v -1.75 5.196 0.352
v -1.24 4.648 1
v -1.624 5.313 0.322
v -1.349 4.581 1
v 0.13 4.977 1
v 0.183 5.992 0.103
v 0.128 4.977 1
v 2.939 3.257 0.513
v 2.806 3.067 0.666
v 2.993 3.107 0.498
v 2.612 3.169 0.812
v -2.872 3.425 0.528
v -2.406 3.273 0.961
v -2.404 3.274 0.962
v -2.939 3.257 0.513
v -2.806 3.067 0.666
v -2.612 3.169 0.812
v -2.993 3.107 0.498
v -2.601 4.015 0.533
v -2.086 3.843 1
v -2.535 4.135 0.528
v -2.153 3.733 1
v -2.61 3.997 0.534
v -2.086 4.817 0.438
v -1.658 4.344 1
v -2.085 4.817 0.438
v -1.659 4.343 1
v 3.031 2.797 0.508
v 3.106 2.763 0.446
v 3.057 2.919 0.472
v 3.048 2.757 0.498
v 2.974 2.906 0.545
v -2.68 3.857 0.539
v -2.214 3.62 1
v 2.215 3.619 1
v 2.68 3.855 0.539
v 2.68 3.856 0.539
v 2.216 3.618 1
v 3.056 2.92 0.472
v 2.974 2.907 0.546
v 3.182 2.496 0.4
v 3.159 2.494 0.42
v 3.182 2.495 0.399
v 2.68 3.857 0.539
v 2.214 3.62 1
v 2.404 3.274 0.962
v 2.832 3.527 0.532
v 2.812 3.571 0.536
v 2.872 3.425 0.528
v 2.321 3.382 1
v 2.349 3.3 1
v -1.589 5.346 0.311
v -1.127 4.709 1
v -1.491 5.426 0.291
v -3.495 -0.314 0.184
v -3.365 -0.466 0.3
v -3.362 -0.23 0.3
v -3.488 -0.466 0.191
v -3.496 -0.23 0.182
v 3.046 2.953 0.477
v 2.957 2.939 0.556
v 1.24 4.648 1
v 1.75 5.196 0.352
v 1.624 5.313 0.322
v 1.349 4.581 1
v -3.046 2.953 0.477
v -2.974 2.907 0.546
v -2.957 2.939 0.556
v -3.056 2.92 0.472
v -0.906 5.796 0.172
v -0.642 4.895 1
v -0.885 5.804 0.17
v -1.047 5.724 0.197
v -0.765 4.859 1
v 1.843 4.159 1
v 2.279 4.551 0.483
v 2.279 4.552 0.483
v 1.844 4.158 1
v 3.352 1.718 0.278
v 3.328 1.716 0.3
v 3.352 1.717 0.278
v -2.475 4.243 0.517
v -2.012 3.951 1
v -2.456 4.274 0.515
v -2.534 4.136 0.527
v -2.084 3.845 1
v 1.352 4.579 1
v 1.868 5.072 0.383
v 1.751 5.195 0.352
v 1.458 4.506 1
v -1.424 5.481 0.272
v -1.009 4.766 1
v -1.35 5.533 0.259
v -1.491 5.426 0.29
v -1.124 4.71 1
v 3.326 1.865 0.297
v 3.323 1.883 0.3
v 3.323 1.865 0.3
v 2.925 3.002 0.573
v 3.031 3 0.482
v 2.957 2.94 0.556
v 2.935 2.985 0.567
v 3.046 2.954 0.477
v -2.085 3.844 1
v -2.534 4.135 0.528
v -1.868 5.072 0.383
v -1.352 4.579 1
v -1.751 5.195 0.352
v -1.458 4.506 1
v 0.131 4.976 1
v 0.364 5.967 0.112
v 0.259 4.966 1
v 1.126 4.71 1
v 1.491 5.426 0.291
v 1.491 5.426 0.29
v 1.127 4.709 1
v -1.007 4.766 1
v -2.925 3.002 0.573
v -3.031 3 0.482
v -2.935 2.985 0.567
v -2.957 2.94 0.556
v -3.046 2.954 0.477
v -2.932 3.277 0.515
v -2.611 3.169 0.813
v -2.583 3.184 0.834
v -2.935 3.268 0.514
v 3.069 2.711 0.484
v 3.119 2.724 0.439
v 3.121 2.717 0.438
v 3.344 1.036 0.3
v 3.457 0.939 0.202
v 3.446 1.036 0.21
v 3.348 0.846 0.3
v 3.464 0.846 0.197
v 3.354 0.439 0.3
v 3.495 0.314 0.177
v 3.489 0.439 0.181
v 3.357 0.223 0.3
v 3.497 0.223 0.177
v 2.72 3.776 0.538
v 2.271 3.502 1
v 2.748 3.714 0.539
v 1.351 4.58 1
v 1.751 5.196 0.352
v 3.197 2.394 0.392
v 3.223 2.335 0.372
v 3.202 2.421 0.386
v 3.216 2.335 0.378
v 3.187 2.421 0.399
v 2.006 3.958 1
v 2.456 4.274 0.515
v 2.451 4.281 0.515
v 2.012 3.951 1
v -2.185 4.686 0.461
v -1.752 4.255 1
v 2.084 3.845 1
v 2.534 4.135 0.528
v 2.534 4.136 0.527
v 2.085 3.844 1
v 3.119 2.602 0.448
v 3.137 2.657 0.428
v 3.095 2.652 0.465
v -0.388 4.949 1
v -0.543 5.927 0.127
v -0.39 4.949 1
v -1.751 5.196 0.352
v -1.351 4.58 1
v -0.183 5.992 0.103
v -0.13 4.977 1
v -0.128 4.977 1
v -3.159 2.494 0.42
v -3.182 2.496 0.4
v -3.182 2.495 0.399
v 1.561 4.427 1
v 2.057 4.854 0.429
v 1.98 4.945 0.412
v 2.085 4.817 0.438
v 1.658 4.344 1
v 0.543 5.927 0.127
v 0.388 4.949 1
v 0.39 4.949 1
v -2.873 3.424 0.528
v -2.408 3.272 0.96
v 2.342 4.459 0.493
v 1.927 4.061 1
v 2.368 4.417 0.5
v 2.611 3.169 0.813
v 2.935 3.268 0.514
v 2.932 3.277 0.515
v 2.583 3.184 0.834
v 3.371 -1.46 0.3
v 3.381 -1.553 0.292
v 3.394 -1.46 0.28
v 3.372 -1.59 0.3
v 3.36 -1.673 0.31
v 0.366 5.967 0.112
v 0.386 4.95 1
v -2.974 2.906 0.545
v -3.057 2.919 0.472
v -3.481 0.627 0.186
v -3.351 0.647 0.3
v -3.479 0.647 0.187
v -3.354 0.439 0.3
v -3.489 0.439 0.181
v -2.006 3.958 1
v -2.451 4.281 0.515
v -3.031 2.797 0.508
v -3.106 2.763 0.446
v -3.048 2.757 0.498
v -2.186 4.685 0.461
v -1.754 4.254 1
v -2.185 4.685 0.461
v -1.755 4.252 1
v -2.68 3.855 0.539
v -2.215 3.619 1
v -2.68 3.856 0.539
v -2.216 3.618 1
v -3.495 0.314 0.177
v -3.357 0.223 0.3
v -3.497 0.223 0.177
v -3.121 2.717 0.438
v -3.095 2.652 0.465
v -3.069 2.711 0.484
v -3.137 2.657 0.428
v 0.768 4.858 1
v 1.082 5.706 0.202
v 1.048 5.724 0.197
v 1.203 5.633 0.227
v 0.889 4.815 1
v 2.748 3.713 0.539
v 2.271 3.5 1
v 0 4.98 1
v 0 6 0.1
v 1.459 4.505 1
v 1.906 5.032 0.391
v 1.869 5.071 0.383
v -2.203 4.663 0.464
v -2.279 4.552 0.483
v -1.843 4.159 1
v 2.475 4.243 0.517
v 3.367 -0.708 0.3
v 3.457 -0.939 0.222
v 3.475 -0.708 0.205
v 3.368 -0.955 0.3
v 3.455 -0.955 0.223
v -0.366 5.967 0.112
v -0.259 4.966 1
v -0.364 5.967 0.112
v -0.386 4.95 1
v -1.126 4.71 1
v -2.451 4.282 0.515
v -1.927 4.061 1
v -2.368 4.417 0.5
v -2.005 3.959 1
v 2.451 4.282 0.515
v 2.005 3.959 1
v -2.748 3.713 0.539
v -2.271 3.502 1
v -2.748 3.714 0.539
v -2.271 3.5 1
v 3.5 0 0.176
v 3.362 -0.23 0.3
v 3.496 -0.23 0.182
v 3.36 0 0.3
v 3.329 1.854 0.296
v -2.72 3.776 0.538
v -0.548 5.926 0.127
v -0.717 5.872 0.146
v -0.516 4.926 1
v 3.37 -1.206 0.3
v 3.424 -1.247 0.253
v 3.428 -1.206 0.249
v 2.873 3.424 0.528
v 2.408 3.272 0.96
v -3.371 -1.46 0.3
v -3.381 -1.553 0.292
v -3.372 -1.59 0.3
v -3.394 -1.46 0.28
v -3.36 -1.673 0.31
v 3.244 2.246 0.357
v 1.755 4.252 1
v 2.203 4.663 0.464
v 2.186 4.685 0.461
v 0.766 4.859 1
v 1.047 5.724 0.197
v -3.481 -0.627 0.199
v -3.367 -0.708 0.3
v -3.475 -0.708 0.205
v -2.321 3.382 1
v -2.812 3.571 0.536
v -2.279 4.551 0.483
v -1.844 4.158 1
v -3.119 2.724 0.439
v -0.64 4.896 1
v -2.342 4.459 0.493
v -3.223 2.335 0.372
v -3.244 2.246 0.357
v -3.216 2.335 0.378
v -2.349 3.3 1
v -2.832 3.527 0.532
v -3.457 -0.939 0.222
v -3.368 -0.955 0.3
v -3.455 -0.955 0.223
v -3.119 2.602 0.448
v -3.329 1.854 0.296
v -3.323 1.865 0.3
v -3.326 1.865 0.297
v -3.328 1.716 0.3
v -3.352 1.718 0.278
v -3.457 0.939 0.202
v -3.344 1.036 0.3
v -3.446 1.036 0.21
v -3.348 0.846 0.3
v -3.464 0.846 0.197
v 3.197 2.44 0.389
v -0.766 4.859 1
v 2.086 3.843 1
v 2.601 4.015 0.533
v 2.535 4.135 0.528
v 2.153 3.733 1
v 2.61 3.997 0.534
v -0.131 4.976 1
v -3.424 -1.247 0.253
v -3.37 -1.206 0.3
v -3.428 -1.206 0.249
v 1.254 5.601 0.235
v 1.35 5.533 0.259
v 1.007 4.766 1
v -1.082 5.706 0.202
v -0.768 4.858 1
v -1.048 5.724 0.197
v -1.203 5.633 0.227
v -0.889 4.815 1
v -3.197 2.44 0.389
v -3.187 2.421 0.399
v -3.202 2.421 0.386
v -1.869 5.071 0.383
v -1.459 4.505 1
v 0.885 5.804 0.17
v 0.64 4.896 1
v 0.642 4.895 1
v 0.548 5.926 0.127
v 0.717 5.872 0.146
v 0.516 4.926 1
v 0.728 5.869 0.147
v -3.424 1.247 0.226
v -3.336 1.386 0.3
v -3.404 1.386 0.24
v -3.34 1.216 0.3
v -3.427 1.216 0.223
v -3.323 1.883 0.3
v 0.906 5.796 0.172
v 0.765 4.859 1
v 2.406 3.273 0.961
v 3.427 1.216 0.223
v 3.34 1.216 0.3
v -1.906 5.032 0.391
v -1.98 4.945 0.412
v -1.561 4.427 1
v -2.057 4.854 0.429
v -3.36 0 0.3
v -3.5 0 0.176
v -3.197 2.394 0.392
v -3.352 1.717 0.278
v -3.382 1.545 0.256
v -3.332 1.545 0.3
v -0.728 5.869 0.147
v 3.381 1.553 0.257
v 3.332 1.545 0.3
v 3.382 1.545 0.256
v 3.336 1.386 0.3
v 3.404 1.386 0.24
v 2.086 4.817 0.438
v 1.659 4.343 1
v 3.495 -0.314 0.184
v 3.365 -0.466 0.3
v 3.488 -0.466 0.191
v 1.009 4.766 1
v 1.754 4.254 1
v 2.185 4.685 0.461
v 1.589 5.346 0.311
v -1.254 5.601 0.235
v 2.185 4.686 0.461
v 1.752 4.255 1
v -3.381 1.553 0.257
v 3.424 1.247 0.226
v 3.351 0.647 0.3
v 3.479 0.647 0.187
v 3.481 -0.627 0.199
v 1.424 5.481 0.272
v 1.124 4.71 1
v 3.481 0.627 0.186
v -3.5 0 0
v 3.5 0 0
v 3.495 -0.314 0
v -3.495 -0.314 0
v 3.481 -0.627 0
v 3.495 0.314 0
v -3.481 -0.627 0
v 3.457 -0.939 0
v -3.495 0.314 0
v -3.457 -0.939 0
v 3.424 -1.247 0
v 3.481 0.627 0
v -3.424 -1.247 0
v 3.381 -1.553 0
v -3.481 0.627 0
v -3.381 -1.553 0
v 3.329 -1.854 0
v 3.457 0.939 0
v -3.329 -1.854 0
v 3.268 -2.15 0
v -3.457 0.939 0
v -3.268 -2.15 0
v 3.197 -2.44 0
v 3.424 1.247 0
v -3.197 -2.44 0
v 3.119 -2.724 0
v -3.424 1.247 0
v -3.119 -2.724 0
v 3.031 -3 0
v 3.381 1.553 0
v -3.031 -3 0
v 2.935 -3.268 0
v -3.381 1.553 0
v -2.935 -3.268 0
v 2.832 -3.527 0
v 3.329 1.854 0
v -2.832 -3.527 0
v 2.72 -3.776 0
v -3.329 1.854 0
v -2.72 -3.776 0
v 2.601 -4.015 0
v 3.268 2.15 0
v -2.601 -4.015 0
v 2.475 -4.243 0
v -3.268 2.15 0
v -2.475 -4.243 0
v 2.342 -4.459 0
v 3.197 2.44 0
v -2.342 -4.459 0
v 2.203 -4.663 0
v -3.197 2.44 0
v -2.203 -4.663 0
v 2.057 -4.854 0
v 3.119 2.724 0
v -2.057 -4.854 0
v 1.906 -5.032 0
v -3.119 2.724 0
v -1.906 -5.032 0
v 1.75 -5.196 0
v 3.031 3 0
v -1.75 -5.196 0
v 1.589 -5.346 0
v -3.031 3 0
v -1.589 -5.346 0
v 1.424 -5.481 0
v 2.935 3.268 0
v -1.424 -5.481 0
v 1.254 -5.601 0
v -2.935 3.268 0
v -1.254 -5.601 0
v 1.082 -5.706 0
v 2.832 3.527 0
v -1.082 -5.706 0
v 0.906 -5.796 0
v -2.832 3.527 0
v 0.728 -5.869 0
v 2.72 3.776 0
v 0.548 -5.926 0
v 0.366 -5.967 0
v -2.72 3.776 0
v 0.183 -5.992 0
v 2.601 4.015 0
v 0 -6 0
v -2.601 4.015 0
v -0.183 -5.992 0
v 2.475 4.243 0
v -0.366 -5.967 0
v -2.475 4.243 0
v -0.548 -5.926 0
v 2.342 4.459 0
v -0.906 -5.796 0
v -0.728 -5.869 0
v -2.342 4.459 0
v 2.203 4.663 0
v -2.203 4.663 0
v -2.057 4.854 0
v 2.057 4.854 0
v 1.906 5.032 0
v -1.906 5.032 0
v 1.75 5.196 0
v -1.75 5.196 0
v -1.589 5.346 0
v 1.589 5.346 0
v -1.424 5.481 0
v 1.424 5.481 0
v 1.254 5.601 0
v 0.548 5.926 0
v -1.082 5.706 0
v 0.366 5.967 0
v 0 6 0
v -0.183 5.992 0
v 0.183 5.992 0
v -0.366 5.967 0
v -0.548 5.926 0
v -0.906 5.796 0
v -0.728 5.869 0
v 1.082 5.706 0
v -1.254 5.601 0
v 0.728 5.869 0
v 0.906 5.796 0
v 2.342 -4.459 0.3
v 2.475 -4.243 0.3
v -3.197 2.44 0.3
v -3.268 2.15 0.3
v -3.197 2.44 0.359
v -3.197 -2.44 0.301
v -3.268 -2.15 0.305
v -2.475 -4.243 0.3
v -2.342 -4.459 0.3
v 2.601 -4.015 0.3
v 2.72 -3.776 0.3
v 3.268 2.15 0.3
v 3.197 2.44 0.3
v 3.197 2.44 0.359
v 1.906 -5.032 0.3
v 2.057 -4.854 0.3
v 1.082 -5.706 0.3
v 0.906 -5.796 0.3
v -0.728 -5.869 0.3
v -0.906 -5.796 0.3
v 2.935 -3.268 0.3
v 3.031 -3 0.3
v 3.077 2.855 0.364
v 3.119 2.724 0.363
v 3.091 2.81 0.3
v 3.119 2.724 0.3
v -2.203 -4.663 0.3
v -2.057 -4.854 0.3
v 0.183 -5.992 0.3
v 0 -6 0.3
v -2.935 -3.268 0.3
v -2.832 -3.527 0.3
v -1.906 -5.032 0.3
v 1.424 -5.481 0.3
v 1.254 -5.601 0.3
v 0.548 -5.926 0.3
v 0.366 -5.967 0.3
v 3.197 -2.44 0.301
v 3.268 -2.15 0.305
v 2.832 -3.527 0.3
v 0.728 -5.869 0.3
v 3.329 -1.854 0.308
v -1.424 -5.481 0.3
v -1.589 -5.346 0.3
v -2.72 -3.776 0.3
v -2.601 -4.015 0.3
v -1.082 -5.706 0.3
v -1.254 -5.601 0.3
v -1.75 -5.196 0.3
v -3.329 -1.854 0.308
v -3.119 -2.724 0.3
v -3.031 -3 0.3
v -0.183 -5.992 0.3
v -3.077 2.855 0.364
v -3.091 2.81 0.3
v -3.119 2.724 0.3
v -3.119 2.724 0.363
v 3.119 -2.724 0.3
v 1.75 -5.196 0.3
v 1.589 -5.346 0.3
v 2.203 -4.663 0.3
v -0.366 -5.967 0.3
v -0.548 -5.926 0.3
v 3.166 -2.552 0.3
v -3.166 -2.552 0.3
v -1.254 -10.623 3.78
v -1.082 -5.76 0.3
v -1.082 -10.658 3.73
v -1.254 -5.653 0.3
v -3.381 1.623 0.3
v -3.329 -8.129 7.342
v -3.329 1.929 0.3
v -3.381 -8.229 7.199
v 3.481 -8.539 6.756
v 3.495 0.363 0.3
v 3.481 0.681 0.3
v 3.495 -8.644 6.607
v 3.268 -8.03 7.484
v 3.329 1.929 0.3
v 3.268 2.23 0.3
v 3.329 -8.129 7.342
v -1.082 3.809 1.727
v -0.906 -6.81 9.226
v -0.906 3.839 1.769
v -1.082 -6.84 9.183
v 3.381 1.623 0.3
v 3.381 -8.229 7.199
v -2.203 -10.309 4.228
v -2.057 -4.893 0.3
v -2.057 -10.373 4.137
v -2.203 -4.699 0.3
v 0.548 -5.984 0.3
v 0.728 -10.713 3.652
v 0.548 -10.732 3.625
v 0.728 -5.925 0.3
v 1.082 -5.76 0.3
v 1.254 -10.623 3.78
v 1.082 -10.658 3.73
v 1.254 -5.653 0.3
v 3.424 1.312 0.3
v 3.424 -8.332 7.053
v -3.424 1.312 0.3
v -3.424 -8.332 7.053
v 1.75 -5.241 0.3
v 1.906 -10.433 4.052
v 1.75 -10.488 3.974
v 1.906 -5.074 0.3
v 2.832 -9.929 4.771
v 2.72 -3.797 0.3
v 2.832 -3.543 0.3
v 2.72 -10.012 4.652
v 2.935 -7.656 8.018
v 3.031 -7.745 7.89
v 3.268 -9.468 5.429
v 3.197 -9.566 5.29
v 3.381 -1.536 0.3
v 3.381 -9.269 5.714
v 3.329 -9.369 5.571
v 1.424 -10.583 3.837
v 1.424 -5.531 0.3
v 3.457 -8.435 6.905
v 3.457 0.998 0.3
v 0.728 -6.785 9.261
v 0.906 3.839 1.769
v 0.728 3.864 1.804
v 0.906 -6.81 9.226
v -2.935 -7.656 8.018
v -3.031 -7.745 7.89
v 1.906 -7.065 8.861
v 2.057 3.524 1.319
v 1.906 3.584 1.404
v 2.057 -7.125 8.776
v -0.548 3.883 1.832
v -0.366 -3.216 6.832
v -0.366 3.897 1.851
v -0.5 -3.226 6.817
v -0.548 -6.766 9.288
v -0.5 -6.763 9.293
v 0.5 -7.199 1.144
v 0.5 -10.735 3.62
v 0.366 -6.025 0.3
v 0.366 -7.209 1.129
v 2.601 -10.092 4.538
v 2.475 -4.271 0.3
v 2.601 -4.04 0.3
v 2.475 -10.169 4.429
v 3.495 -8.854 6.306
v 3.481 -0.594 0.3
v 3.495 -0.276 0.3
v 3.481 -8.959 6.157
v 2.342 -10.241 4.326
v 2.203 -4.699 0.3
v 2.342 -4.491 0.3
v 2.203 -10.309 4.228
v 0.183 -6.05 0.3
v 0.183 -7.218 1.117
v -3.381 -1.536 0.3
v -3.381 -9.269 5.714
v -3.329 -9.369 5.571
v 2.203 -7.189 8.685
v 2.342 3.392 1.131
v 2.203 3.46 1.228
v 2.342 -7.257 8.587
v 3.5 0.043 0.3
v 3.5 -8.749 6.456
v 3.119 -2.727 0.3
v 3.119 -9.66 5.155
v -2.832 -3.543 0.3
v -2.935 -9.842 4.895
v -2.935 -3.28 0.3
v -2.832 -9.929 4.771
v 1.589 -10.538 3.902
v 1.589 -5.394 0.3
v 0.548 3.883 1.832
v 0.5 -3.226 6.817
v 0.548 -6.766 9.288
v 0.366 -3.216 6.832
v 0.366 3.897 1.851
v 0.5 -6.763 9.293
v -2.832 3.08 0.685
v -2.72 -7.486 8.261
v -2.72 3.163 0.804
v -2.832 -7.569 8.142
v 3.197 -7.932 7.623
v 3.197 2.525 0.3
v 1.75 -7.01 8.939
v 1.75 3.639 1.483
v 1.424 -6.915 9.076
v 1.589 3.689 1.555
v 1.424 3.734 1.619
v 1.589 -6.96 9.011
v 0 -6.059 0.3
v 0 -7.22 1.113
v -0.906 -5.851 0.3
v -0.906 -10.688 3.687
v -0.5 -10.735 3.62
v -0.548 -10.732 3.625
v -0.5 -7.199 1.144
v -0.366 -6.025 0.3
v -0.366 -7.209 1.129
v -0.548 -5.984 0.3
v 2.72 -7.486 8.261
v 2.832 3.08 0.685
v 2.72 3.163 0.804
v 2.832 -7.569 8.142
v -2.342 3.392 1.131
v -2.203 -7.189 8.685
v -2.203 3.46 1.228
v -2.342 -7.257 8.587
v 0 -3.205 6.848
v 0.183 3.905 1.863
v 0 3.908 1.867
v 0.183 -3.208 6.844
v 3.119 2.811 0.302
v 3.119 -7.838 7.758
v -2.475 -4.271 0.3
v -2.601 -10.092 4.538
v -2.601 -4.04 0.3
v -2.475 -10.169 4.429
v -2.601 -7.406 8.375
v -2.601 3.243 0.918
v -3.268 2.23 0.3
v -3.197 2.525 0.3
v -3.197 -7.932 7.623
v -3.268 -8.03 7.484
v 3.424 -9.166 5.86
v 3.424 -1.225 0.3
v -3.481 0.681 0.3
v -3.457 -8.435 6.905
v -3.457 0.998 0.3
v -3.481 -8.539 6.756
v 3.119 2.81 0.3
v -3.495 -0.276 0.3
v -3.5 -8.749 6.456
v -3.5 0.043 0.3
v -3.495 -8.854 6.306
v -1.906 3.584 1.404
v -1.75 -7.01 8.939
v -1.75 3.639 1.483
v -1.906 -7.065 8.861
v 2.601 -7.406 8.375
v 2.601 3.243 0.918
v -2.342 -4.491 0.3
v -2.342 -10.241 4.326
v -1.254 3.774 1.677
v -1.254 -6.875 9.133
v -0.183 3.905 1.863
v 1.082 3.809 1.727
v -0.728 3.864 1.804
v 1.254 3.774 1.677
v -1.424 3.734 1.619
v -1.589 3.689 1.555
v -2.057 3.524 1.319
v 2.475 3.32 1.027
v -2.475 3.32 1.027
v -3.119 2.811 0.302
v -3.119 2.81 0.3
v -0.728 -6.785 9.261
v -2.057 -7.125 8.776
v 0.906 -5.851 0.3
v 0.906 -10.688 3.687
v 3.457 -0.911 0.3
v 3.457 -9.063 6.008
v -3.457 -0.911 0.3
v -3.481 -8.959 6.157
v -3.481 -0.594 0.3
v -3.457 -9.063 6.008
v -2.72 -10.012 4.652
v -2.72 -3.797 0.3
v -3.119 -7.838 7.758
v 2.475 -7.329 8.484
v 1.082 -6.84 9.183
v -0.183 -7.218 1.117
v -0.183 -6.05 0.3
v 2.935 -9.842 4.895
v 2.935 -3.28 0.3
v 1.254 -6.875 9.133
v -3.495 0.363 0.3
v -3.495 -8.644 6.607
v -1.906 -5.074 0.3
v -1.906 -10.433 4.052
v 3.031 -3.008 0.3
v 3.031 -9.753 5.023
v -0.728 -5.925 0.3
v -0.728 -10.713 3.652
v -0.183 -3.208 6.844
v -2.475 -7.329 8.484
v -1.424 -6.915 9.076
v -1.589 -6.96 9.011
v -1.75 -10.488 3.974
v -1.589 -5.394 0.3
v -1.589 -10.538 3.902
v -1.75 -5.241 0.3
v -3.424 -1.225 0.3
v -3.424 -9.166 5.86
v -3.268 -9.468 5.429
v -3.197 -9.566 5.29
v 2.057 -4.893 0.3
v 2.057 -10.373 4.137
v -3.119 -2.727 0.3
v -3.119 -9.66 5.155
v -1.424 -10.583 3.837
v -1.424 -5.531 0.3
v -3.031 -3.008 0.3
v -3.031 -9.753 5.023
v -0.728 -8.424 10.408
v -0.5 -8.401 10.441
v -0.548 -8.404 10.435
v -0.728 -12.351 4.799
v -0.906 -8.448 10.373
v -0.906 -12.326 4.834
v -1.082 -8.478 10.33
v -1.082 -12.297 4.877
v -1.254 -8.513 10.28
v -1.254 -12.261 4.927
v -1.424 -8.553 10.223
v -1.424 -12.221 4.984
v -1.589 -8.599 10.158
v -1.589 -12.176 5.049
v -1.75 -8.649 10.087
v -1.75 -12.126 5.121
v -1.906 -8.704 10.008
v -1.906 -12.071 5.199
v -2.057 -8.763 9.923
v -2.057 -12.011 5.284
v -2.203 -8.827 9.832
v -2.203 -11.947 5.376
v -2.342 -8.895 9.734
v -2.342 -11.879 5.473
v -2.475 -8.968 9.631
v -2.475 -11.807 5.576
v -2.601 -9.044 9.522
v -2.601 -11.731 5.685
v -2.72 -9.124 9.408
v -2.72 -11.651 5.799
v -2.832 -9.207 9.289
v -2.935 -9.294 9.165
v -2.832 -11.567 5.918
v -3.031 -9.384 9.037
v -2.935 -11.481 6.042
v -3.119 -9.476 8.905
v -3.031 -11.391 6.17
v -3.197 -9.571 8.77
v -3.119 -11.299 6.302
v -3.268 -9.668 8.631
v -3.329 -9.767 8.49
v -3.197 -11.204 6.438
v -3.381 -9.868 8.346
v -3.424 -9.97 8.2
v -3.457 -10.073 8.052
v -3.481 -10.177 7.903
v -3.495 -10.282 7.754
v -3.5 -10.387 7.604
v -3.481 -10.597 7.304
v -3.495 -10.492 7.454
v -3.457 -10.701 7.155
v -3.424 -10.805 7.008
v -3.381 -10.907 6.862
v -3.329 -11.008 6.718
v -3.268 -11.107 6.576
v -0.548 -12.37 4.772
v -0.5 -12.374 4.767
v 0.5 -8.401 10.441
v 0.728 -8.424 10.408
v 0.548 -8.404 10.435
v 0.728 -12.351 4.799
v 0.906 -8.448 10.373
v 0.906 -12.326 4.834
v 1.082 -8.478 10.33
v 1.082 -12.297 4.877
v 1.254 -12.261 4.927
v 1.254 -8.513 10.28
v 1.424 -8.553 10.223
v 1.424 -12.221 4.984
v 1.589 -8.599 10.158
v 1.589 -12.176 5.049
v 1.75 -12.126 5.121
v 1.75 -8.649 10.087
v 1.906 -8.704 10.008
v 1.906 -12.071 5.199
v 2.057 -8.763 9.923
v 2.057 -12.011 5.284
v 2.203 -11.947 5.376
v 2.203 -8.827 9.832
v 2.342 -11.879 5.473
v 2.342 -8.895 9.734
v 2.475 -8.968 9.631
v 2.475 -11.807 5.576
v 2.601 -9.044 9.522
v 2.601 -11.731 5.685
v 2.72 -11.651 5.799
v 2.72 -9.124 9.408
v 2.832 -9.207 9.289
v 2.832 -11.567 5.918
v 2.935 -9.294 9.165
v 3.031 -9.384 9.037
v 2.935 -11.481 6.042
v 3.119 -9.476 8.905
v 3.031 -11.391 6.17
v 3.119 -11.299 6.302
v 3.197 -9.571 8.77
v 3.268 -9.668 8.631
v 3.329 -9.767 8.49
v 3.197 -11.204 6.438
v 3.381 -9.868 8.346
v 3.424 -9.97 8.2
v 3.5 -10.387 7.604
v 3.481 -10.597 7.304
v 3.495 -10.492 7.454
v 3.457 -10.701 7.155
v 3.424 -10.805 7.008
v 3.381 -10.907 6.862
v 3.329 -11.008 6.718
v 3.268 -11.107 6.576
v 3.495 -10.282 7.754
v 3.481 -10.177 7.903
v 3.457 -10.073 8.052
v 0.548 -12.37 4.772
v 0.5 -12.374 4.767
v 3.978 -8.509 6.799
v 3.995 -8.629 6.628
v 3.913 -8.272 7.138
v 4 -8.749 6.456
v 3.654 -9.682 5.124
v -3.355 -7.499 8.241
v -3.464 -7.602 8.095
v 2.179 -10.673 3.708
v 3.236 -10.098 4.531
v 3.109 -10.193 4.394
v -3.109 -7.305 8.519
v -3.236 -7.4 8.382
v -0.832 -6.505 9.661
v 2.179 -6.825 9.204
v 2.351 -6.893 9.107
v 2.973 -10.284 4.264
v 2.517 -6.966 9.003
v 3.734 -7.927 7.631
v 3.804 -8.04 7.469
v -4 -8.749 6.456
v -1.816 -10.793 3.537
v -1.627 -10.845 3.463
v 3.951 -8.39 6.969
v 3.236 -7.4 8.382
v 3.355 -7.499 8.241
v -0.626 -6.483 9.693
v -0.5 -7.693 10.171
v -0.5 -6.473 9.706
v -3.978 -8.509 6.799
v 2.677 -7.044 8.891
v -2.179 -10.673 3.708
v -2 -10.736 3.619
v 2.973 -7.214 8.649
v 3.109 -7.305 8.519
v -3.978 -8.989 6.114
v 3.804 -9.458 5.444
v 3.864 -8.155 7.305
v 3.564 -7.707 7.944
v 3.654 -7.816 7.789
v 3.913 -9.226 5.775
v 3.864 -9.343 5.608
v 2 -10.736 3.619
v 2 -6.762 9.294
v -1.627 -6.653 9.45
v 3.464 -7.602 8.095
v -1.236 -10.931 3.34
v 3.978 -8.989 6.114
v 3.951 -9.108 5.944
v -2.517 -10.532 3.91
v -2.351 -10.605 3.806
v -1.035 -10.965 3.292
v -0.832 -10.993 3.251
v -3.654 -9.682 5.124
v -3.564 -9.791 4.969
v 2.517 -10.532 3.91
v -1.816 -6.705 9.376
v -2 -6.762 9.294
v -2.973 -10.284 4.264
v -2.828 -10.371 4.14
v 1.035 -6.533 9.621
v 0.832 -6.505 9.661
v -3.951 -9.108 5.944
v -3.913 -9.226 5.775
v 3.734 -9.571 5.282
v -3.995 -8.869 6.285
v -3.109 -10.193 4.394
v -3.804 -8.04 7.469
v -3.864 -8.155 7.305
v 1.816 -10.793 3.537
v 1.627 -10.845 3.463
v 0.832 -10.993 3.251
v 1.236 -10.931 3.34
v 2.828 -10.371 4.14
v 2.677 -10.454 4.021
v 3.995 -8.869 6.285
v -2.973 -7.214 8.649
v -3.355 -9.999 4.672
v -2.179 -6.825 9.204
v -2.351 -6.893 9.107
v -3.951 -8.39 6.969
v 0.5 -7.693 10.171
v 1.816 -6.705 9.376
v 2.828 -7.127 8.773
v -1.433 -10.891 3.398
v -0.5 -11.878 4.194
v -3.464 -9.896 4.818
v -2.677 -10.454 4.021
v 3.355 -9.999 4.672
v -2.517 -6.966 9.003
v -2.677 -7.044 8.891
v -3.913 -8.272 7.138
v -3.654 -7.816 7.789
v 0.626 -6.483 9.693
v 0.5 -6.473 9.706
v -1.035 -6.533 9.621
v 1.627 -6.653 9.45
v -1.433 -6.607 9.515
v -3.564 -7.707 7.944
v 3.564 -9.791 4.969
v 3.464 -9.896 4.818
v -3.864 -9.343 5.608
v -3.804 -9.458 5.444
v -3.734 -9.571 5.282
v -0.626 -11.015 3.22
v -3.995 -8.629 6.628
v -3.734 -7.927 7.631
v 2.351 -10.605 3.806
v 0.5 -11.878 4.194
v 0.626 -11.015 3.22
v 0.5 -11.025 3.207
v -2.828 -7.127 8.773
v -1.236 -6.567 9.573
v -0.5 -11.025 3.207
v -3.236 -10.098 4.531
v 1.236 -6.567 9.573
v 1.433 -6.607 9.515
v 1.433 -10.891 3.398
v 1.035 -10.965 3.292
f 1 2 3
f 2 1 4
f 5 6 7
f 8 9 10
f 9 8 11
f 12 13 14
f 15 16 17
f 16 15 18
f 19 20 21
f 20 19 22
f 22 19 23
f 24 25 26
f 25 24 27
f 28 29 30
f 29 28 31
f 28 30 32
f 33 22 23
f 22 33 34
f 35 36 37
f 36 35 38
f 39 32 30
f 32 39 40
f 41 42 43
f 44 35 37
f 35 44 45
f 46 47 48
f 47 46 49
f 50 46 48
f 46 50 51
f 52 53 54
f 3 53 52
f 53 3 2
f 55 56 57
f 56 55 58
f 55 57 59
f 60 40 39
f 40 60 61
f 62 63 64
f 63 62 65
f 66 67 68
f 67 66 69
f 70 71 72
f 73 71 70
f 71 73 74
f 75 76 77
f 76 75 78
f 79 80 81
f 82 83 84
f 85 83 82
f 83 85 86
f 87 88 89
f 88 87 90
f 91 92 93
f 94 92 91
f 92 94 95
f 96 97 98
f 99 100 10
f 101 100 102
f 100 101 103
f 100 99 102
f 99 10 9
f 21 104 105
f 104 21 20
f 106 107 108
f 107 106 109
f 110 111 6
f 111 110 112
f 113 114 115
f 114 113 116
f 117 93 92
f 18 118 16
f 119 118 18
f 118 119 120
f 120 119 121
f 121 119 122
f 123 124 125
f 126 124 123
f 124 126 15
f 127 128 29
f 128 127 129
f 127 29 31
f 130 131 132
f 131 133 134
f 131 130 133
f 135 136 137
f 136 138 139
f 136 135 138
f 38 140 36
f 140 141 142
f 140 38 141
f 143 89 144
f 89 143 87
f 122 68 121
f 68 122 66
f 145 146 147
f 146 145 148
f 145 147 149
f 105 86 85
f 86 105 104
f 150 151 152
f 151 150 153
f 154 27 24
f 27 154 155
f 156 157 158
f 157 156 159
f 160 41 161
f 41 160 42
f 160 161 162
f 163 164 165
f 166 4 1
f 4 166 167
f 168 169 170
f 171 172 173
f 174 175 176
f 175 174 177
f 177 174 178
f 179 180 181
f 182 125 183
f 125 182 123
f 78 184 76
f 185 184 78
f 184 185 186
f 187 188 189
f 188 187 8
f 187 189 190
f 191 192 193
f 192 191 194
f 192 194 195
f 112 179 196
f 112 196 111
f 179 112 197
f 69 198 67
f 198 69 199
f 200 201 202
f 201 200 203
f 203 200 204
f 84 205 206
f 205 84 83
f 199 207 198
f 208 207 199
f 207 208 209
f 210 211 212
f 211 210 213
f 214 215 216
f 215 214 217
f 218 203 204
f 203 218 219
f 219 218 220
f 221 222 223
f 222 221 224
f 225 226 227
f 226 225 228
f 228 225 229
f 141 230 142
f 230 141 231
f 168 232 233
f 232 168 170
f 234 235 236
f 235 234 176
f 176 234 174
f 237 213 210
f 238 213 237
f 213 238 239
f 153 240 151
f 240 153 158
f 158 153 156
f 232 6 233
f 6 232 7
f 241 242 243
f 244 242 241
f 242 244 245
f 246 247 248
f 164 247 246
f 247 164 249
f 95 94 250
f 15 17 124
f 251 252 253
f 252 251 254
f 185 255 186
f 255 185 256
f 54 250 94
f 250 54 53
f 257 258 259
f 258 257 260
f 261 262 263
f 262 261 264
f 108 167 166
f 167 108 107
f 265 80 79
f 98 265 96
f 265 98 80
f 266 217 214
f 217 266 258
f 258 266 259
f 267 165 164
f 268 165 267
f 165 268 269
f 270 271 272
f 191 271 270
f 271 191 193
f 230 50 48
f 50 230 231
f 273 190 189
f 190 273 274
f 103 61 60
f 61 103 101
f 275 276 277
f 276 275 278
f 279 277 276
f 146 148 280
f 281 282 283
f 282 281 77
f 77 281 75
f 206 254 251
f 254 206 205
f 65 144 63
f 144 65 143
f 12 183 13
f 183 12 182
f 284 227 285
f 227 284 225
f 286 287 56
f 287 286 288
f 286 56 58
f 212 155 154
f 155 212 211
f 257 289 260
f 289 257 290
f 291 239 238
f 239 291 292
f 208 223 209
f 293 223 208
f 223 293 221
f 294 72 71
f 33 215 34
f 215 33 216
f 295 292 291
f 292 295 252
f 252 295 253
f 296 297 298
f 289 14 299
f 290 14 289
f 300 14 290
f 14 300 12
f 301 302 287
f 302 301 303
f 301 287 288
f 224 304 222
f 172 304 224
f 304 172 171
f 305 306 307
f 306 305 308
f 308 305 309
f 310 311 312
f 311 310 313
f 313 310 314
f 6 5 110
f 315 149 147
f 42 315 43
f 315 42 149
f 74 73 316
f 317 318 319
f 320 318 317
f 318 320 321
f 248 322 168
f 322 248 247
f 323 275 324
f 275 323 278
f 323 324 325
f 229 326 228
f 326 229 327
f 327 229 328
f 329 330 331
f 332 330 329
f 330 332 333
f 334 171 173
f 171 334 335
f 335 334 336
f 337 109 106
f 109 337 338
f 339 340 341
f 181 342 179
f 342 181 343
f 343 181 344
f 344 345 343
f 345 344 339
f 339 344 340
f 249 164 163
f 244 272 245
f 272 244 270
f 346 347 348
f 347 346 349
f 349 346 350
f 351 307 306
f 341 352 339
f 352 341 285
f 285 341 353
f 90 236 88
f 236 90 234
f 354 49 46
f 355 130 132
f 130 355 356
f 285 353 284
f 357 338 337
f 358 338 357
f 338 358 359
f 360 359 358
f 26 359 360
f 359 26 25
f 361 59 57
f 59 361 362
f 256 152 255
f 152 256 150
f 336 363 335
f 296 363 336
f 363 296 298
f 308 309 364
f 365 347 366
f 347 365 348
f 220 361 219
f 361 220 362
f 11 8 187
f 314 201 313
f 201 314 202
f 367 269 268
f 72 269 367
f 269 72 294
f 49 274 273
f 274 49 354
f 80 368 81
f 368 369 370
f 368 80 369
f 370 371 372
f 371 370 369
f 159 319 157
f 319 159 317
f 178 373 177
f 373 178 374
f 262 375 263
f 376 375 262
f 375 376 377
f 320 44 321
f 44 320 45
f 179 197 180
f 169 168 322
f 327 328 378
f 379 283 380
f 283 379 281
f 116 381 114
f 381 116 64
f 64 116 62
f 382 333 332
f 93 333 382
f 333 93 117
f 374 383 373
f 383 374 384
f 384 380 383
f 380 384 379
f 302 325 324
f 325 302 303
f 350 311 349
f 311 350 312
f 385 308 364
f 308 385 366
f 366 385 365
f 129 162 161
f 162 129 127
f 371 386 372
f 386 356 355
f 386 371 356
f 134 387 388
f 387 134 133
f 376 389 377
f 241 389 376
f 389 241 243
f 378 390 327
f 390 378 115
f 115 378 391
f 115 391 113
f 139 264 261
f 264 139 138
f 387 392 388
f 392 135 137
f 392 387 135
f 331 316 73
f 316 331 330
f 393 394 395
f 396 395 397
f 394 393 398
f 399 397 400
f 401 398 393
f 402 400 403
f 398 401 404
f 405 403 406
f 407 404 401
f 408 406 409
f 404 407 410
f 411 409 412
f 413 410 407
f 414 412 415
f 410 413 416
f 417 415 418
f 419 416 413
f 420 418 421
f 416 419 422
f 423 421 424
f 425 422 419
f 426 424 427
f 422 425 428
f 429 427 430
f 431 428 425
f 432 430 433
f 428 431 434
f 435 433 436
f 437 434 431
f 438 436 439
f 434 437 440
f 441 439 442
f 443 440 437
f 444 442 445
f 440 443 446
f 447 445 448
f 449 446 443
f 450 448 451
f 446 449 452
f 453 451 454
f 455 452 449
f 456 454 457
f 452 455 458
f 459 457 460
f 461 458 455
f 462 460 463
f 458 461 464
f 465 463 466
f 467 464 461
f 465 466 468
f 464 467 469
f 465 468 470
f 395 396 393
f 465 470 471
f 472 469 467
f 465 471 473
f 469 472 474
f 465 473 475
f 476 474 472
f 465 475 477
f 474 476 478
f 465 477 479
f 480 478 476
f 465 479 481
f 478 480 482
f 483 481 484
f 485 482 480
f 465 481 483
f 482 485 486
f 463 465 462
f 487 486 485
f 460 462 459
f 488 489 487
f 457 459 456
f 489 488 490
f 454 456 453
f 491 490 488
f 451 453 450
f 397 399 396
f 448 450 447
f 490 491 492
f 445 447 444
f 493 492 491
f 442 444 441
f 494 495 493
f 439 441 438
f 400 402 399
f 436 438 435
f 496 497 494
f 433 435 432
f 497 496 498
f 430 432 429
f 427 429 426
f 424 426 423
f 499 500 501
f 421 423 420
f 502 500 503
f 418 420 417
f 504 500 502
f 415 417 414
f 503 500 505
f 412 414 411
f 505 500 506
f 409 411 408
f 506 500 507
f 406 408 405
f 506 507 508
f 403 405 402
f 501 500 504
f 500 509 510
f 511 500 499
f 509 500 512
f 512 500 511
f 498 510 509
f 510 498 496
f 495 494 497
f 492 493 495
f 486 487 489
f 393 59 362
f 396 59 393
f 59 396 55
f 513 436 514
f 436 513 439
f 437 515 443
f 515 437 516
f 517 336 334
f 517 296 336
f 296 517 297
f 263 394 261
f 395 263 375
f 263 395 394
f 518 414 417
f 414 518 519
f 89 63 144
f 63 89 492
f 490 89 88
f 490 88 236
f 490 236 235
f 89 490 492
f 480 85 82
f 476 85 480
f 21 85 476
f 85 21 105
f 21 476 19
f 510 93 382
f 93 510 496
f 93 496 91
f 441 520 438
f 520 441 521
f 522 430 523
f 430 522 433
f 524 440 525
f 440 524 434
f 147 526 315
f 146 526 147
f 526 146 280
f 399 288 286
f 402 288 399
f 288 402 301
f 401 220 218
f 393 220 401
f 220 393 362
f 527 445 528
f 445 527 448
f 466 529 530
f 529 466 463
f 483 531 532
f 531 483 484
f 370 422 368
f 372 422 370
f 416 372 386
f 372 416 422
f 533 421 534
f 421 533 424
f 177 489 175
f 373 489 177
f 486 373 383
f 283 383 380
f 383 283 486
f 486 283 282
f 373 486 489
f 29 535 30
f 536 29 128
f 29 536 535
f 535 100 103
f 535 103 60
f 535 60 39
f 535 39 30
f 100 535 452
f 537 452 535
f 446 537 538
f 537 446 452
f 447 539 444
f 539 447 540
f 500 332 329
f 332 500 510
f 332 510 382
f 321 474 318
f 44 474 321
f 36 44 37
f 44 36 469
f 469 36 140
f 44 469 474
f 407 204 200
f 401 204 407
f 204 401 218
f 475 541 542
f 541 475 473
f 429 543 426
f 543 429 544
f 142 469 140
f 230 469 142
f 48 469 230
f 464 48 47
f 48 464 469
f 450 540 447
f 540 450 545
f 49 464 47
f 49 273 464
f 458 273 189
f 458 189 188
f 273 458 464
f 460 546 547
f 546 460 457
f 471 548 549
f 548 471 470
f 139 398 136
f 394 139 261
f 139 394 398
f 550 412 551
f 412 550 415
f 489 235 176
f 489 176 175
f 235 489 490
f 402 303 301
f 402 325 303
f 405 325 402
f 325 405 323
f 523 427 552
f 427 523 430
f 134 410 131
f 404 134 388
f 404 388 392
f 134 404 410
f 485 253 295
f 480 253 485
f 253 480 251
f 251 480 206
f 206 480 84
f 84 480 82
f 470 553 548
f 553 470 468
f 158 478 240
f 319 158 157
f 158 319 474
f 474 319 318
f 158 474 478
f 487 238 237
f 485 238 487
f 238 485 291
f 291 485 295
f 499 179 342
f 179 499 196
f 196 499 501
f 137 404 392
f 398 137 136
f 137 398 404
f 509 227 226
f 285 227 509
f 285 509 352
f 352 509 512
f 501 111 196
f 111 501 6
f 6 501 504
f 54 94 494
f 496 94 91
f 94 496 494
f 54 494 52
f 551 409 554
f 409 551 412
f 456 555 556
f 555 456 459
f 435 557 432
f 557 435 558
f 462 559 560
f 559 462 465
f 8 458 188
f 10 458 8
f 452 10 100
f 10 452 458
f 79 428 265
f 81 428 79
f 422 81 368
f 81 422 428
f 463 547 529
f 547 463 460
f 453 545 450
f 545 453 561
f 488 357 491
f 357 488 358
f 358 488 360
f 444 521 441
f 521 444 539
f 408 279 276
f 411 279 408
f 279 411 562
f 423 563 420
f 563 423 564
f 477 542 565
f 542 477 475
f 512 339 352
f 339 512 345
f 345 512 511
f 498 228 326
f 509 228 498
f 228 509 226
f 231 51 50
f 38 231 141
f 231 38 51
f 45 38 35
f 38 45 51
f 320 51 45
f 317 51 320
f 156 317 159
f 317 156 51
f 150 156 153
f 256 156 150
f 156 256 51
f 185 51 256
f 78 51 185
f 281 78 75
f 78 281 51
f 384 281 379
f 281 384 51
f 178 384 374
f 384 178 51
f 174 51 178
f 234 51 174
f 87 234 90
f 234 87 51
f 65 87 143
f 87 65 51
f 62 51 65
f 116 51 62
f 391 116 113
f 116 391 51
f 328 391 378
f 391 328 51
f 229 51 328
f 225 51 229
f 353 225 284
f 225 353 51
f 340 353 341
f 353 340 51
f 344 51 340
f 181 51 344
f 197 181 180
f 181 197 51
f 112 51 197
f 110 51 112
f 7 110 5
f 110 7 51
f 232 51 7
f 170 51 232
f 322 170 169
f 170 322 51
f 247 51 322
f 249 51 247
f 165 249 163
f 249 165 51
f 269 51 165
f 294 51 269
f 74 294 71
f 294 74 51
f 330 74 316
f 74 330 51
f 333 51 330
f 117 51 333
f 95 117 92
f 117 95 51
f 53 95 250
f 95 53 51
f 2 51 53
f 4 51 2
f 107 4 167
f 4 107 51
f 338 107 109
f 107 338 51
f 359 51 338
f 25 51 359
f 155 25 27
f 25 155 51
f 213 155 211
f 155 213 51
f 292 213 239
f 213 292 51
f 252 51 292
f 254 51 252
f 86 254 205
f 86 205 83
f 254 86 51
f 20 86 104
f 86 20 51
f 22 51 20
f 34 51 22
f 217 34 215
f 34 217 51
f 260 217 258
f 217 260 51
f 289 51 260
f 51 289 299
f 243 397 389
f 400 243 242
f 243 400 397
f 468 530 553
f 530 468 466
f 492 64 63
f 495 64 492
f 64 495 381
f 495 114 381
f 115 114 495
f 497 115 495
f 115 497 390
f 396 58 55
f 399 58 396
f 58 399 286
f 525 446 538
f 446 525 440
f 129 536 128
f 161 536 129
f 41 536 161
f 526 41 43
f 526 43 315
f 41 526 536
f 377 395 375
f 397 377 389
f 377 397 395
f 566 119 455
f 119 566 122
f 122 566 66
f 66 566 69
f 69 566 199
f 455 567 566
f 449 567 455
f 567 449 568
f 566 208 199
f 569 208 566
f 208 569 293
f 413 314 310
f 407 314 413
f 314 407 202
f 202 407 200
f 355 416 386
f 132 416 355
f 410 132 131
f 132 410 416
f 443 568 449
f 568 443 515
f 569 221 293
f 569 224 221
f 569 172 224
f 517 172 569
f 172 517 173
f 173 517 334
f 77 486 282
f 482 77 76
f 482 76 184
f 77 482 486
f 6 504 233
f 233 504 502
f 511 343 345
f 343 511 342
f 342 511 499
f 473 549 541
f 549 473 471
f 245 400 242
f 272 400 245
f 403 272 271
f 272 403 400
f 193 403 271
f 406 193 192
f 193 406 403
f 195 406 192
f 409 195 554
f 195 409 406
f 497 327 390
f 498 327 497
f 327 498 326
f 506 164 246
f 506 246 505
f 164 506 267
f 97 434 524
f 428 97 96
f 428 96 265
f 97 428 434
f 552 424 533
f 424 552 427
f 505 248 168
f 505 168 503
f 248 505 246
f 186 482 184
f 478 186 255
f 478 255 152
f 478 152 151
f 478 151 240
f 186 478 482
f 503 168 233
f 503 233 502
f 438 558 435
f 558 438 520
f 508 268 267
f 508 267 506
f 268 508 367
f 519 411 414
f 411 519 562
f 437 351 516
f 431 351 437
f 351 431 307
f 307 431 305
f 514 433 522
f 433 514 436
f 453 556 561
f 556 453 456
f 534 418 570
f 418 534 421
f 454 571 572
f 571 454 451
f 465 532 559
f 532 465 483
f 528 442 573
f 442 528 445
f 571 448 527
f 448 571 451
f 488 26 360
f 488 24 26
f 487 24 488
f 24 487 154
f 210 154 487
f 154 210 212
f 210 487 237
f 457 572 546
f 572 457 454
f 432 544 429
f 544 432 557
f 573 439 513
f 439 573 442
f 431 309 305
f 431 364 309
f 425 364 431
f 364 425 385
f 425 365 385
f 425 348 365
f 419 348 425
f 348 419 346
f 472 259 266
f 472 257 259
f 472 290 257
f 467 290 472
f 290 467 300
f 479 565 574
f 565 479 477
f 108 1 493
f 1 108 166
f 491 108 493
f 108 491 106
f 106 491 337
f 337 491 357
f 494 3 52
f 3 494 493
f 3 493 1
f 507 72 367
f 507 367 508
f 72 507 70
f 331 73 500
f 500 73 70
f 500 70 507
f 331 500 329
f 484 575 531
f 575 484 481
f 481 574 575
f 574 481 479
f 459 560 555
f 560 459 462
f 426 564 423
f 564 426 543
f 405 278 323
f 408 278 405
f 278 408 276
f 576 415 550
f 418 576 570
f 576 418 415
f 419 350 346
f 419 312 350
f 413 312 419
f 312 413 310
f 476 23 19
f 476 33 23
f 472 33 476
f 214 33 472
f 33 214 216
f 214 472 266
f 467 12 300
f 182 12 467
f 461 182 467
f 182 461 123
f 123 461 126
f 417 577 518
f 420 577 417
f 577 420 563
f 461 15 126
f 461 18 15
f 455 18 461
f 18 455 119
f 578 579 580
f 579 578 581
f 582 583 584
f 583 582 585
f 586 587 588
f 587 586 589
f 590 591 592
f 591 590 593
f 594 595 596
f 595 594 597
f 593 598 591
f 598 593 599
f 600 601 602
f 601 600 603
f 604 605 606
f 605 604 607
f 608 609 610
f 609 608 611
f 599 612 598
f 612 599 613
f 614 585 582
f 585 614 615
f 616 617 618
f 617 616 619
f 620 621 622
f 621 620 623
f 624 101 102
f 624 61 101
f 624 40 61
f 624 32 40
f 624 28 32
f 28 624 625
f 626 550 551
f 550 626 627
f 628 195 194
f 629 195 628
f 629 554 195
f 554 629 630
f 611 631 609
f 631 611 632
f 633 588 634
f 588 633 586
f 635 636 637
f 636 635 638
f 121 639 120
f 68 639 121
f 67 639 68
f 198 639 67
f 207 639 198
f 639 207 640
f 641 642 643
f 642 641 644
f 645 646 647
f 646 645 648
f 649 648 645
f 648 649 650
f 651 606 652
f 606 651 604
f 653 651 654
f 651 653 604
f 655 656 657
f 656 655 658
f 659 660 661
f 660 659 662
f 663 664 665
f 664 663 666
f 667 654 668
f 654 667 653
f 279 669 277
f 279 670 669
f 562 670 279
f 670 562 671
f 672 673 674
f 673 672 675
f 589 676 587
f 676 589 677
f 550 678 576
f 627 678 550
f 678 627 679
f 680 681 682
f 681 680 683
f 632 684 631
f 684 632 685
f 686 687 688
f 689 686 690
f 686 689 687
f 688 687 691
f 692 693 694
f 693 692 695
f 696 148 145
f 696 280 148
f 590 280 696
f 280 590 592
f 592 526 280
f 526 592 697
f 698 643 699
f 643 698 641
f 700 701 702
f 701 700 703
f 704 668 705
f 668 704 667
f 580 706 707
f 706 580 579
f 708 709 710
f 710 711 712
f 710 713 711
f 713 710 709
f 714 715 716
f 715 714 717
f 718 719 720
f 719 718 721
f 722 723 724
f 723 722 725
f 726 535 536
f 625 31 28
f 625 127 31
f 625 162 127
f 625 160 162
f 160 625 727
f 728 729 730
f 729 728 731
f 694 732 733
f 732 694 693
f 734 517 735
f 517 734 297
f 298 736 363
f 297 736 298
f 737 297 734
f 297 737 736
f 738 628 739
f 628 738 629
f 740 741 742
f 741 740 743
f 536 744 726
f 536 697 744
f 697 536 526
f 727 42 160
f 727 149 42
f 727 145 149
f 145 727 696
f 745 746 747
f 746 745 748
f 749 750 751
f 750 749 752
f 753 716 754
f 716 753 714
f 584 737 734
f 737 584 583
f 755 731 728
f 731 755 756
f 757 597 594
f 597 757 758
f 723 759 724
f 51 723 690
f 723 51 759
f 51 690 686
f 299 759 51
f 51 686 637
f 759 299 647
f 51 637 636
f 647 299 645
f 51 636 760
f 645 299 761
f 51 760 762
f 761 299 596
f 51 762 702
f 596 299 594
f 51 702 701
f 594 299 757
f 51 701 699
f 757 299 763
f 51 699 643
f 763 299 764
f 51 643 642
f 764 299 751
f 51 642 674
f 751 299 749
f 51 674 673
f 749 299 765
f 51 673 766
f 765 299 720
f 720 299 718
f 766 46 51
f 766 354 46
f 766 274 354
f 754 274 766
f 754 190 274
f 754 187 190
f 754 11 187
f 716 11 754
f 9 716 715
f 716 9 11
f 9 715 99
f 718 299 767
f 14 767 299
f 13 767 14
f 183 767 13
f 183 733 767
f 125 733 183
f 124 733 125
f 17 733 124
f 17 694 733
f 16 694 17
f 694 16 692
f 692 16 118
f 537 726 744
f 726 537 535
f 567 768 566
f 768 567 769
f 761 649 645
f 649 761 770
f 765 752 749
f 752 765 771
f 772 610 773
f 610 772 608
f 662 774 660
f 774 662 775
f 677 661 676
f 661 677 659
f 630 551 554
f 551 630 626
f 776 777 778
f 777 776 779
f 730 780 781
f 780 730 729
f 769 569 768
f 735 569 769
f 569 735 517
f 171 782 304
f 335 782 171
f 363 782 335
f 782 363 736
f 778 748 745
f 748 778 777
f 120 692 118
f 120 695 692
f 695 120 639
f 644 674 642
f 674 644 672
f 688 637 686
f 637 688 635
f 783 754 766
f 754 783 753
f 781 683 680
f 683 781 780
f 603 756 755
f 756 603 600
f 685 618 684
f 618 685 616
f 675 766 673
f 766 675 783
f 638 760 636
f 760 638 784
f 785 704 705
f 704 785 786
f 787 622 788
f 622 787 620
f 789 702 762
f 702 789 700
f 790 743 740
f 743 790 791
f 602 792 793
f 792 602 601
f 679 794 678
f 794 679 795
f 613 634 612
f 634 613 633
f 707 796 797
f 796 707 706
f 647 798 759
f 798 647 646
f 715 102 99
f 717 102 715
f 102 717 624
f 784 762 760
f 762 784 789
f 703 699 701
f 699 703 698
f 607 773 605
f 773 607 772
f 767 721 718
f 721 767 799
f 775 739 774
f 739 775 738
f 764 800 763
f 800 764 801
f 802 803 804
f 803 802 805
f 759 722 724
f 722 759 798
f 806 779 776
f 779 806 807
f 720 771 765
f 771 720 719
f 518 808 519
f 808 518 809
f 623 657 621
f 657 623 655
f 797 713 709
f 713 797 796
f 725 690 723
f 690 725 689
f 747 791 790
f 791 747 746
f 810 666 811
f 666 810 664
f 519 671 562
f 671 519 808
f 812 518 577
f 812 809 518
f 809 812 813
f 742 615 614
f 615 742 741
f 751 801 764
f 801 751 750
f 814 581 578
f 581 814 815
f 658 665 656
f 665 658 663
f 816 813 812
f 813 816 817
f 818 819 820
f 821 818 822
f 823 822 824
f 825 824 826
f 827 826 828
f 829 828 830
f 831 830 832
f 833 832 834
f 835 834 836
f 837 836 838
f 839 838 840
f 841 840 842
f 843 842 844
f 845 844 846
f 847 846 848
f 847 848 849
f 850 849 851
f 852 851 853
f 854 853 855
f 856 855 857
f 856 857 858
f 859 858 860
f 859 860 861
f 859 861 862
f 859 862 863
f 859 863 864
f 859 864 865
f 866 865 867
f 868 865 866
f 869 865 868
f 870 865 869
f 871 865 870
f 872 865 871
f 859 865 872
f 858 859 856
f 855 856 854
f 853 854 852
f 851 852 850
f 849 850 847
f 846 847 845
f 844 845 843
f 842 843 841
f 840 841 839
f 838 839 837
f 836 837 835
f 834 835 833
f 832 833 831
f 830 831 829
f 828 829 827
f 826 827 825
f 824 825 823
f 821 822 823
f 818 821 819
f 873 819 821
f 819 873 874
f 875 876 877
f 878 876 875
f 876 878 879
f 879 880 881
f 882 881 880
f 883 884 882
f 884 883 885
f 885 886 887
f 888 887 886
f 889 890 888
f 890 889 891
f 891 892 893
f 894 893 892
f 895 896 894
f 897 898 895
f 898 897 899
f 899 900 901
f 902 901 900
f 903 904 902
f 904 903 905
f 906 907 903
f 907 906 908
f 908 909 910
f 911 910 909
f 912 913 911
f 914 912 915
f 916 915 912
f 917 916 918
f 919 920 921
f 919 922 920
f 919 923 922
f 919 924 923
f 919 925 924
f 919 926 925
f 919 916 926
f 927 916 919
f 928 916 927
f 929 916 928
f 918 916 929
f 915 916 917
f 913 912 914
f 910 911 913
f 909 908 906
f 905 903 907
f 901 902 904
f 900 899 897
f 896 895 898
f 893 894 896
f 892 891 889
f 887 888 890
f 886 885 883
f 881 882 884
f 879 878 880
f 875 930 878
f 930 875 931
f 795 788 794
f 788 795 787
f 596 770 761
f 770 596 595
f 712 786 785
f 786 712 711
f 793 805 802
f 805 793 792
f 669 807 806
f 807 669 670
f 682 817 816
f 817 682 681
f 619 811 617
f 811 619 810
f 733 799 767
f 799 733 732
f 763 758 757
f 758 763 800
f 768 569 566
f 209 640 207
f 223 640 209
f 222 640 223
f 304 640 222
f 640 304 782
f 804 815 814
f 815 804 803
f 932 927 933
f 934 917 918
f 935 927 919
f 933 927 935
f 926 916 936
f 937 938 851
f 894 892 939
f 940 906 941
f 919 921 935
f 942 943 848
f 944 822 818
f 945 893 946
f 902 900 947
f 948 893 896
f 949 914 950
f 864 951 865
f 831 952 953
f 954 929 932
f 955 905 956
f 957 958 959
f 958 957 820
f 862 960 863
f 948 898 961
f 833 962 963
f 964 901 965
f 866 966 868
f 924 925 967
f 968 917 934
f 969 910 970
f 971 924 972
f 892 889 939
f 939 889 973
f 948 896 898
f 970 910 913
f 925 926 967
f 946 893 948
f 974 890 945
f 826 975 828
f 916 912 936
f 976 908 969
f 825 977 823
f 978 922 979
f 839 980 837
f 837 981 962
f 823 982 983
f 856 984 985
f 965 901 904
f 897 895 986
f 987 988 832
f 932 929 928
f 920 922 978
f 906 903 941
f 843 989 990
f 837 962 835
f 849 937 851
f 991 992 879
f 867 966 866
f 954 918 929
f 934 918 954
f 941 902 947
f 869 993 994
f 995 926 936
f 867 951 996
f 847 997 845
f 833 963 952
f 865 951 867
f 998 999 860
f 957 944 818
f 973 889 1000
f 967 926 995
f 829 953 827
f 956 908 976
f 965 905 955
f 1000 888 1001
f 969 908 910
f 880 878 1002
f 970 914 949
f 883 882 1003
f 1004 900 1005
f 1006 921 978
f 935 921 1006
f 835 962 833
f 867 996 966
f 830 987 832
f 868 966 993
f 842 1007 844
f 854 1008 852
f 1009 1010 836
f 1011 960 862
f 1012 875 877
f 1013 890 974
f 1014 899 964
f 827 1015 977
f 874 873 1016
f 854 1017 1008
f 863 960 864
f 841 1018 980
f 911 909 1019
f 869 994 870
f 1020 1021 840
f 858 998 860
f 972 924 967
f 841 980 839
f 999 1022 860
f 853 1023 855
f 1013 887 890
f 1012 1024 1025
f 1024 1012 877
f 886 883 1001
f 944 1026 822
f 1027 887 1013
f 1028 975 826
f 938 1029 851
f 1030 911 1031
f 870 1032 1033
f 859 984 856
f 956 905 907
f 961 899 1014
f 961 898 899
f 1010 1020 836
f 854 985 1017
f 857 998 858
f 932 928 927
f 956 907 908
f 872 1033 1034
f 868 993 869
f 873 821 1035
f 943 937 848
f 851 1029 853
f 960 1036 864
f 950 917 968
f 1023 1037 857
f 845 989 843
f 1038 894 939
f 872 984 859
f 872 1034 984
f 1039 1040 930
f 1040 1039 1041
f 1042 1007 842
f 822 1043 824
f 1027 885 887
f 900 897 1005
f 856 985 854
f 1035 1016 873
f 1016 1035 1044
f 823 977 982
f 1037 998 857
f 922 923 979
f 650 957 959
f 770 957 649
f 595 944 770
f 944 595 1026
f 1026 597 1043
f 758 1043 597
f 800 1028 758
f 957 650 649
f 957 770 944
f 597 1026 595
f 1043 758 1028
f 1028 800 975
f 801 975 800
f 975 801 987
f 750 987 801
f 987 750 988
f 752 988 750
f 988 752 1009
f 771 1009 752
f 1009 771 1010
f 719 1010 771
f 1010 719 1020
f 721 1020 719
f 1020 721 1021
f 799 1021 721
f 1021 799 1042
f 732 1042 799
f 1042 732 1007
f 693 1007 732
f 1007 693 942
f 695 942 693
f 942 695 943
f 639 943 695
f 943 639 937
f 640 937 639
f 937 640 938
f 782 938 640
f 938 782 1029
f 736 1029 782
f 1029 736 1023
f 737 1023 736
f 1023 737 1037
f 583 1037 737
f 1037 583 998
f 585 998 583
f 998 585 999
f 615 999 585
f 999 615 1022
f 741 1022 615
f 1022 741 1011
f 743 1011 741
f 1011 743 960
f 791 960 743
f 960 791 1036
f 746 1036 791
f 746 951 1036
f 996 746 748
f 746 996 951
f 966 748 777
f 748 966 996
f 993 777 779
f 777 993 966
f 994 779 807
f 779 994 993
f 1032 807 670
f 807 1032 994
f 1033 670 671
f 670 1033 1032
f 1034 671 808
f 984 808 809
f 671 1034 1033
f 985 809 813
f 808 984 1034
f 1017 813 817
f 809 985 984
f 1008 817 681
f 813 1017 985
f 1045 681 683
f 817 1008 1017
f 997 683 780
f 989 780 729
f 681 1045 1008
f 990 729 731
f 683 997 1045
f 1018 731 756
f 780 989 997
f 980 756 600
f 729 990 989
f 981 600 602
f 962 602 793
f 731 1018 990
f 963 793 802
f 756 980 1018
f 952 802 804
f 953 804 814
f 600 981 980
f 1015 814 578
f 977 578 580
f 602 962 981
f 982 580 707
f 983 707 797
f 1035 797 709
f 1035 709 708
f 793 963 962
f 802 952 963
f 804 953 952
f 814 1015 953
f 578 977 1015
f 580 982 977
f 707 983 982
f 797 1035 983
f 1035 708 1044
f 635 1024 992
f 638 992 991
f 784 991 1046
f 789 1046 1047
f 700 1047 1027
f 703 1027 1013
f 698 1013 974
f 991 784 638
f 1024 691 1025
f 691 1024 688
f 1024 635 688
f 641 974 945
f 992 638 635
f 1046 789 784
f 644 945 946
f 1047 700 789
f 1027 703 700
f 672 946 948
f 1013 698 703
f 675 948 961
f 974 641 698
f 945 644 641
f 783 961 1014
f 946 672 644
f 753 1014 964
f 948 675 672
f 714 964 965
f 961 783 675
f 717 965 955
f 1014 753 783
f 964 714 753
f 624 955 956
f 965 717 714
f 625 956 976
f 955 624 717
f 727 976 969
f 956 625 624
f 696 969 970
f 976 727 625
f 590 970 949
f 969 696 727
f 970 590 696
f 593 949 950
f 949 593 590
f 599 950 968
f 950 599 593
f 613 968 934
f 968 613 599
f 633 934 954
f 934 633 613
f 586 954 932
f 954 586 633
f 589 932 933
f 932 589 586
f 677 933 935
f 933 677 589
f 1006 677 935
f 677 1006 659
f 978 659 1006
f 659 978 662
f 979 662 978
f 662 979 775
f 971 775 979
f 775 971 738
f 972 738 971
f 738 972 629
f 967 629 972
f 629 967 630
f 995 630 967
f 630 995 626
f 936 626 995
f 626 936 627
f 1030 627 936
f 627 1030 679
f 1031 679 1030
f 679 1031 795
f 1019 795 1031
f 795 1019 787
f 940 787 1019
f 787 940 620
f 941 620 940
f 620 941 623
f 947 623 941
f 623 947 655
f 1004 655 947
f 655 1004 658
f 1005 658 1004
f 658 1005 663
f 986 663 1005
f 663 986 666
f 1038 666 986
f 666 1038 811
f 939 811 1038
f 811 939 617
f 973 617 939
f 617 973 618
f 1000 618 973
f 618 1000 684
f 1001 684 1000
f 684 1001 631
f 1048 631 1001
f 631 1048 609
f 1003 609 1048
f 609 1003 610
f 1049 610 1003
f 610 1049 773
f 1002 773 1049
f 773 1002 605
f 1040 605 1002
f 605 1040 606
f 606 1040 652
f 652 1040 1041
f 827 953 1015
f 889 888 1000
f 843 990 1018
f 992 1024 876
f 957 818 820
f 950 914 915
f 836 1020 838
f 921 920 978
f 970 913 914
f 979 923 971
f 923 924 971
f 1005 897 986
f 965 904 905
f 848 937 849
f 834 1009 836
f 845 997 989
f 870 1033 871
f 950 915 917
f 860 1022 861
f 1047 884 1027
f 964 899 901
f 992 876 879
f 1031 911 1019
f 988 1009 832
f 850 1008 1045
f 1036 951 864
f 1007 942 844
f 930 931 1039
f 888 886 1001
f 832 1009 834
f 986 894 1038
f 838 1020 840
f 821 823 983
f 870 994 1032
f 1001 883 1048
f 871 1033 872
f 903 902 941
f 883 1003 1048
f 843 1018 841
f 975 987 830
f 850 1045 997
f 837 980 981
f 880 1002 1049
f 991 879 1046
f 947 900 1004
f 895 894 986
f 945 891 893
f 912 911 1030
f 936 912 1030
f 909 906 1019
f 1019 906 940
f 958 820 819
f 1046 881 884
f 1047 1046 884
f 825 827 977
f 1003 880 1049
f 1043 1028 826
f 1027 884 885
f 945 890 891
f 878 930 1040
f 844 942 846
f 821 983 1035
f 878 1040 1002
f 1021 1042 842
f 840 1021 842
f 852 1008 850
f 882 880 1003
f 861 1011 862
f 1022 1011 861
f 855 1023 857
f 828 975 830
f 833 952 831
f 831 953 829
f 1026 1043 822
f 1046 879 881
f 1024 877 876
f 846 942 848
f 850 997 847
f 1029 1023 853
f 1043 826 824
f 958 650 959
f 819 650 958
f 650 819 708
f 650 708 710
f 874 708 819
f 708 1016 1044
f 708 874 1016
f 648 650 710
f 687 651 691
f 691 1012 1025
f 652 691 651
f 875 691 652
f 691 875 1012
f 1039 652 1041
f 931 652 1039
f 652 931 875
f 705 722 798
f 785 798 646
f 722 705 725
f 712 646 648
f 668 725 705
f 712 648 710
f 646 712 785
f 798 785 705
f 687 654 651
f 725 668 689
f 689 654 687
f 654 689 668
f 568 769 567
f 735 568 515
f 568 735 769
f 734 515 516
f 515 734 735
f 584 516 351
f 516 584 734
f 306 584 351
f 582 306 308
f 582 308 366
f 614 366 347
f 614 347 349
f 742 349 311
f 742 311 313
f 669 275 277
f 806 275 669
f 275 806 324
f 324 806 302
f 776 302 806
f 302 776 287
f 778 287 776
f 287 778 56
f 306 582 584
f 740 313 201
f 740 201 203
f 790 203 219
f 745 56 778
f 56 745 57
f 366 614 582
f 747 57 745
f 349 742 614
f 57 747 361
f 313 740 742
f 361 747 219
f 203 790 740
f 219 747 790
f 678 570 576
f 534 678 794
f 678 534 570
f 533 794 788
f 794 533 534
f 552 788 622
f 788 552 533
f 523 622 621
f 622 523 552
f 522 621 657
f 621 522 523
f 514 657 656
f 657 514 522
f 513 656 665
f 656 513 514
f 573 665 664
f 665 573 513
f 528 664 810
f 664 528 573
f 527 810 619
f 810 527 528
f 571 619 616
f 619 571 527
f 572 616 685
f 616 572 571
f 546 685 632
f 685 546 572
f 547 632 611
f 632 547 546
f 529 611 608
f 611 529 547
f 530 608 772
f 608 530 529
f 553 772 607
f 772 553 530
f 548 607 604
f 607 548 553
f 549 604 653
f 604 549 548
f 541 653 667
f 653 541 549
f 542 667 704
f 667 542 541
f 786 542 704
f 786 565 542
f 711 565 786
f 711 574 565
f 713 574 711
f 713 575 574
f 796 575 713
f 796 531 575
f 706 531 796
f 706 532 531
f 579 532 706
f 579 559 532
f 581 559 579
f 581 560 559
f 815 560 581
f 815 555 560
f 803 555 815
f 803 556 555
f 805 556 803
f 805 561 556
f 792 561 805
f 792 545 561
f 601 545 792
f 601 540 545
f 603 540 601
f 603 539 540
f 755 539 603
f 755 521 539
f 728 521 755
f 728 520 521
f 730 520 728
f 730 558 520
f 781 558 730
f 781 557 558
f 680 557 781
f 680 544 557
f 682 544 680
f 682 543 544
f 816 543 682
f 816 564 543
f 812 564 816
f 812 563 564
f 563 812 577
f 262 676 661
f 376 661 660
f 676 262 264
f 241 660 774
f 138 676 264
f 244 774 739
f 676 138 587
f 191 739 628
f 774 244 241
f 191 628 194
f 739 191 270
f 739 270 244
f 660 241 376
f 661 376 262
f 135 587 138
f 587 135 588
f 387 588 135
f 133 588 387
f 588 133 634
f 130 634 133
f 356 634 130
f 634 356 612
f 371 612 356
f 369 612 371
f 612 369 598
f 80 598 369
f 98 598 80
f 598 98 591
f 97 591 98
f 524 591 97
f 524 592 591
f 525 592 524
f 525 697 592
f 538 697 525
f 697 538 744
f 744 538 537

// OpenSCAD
$fn = 120;

r1 = 7 / 2;
r2 = 12 / 2;
a = 55;

top();

difference() {
    plug();
    translate([0, 0, -2.2]) cube([15, 15, 5], true);
}

module top() {
    intersection() {
        minkowski() {
            oval(0.1, 5, 0.1);
            translate([0, -2.5, 0]) cylinder(r1 = 3.5, r2 = 0.1, h = 3);
        }
        oval(r1, r2, 1);
    }
}
module plug() {
    difference() {
        translate([0, 1.9, -1]) 
            rotate([a, 0, 0]) {
                cylinder(r = r1, h = 15);
                translate([0, 0, 13]) cylinder(r1 = r1 + 0.5, r2 = r1, h = 2);
        }
        translate([-0.5, -8, 0]) rotate([a, 0, 0]) cube([1, 10, 10]);
    }
}

module oval(w, h, height, center = false) {
    scale([1, h / w, 1]) cylinder(h = height, r = w, center = center);
}
